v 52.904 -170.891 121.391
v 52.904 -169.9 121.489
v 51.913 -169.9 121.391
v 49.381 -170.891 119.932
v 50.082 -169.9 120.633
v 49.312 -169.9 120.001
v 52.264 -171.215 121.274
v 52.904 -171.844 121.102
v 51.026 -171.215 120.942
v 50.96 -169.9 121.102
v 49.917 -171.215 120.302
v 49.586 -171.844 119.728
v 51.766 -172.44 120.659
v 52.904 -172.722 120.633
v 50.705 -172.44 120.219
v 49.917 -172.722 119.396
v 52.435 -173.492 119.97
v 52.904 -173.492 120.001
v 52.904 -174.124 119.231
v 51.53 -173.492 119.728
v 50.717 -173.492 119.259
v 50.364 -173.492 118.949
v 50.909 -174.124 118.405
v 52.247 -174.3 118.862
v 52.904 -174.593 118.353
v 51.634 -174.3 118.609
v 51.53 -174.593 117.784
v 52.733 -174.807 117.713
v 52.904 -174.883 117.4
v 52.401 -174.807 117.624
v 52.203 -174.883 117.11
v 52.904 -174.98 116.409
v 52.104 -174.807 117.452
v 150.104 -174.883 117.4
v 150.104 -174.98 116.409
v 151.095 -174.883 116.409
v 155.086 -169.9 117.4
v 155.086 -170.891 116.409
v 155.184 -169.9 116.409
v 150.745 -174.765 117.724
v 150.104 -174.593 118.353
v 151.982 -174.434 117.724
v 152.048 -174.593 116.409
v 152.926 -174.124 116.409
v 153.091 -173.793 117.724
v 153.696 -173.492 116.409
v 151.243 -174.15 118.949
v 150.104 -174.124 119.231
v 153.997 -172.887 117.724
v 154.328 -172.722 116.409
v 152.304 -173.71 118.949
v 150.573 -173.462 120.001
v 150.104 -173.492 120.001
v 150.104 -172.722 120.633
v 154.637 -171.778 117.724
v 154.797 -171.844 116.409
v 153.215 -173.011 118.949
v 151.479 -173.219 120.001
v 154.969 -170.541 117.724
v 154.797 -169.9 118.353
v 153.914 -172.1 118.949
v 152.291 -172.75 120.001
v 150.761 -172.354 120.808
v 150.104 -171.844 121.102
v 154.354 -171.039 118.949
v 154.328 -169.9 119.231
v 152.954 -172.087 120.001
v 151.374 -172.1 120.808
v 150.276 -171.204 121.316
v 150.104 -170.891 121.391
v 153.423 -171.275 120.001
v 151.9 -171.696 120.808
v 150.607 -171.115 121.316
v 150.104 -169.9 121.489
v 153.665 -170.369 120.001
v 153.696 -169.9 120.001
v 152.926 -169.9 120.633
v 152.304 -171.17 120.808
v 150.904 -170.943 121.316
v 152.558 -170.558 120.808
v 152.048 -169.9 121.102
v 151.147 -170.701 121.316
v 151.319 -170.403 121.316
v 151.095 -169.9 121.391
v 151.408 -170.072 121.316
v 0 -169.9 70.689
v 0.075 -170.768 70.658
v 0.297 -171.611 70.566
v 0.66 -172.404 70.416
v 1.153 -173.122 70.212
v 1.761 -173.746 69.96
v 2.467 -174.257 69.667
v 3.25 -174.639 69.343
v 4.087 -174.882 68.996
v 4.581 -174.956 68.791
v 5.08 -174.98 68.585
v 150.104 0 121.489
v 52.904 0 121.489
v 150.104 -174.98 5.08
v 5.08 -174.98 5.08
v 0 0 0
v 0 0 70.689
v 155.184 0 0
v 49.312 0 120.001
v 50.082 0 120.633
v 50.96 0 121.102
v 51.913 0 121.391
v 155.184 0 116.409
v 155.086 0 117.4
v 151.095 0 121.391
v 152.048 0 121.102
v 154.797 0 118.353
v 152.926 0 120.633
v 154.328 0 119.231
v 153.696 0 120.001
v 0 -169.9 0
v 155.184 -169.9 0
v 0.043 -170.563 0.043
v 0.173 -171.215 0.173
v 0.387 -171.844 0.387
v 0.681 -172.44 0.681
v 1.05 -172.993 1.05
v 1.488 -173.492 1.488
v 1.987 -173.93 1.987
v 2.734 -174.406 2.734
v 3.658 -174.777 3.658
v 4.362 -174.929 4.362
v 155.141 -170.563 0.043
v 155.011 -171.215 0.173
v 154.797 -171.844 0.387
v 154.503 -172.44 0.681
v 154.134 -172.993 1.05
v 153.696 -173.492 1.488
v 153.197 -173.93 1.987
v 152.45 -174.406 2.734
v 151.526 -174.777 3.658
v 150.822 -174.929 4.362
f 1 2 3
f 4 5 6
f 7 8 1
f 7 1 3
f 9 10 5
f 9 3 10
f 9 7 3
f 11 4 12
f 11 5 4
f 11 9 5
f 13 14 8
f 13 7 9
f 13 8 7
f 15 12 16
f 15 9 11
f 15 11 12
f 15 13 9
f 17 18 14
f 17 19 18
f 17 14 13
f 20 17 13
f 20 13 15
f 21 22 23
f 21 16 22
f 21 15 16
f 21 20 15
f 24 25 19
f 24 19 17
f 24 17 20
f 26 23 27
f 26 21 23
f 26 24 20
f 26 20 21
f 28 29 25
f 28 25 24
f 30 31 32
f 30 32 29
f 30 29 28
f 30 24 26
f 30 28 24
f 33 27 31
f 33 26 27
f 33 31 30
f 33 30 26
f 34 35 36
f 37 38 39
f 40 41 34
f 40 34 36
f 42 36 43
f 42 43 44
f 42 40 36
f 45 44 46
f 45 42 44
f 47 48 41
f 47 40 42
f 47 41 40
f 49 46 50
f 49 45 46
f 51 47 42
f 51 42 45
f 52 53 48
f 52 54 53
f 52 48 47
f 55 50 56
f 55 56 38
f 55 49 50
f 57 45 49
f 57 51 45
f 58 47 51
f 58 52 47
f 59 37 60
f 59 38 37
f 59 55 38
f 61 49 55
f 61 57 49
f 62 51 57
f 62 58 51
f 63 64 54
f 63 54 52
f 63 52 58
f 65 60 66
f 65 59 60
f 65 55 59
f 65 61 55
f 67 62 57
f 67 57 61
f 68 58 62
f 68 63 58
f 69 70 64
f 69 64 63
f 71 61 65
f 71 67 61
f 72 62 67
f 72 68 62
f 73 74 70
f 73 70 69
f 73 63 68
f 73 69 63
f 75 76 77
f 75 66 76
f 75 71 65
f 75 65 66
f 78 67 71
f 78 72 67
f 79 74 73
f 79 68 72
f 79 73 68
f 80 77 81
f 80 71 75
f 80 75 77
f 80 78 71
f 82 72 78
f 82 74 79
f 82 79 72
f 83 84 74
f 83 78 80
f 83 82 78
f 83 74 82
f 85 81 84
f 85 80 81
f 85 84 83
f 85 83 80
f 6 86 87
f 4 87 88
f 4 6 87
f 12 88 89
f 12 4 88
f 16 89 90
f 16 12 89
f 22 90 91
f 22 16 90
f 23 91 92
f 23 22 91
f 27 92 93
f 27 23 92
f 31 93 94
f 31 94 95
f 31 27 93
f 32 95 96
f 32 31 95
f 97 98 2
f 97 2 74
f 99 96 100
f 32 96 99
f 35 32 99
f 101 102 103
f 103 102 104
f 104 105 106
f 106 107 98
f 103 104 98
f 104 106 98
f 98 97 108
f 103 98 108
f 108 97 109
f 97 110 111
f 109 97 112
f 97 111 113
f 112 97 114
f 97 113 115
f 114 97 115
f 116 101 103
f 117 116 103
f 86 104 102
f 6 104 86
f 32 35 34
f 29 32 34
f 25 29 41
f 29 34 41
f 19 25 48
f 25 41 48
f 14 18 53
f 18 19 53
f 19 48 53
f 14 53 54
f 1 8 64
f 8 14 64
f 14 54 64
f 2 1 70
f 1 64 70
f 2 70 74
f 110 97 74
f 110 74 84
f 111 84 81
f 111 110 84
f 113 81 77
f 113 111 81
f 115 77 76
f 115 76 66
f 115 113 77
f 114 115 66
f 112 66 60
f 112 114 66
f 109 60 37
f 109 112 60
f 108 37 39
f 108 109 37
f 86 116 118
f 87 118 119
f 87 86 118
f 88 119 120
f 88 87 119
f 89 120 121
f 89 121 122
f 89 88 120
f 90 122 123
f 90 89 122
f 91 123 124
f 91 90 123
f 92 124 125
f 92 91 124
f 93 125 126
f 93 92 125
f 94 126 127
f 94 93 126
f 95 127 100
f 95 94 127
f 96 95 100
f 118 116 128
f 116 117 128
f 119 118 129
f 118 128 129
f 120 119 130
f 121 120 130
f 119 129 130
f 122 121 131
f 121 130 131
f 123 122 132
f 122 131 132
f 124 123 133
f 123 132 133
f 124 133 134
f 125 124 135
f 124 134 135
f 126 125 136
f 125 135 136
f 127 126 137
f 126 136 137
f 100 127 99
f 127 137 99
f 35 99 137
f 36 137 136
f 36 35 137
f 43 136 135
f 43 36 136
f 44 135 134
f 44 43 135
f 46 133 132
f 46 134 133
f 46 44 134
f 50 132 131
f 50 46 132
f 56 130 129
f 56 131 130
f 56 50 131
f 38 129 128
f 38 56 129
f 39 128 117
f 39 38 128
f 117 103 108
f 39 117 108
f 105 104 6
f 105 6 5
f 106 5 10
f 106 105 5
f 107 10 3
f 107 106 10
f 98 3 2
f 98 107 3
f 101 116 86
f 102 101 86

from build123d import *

# Parameters (mm, degrees)
F0_W         = 155.1840901375
F0_H         = 121.4890033007
F1_DEPTH     = 174.9801635742
F2_SIZE      = 50.8
F3_R         = 5.08
F4_T1_DEPTH  = 182.6001635742
F4_T3_DEPTH  = 175.1606758164
F4_T8_DEPTH  = 5.08
F4_S13_W     = 5.08
F4_S13_H     = 5.08
F4_T14_DEPTH = 5.08


# Not quite as in the source:
# - a fillet or chamfer that OpenCascade refuses, or shapes differently, is made with other operations: its cross-section is extruded or revolved along the edge and cut away or added


with BuildPart() as f1:
    # F0 (on Front) → F1 (new body)
    with BuildSketch(Plane.XZ):
        with Locations((77.5920450687, 60.7445016503)):
            Rectangle(F0_W, F0_H)
    extrude(amount=F1_DEPTH)

    # F2
    f2_edges = [f1.edges().sort_by_distance(p)[0] for p in [
        (0, -87.490082, 121.489003),
    ]]
    chamfer(f2_edges, length=F2_SIZE)

    # F3
    f3_edges = [f1.edges().sort_by_distance(p)[0] for p in [
        (25.4, -174.980164, 96.089003),
        (0, -174.980164, 35.344502),
        (77.592045, -174.980164, 0),
        (102.992045, -174.980164, 121.489003),
        (155.18409, -174.980164, 60.744502),
    ]]
    fillet(f3_edges, radius=F3_R)

    # F4: fillet of radius 5.08 on 4 edges, made by hand

    # F4_s2 → F4_t1 (cut)
    with BuildSketch(Plane.XZ.offset(-12.7)):
        with BuildLine():
            ThreePointArc((150.1040901375, 121.4890033007), (153.6961925859, 120.0011057491), (155.1840901375, 116.4090033007))
            Line((155.1840901375, 116.4090033007), (155.1840901375, 121.4890033007))
            Line((155.1840901375, 121.4890033007), (150.1040901375, 121.4890033007))
        make_face()
    extrude(amount=F4_T1_DEPTH, mode=Mode.SUBTRACT)

    # F4_s4 → F4_t3 (cut)
    with BuildSketch(Plane.XZ.offset(-5.2605122421)):
        with BuildLine():
            ThreePointArc((49.3121024484, 120.0011057491), (50.9601730604, 121.1023113258), (52.9042048969, 121.4890033007))
            Line((52.9042048969, 121.4890033007), (50.8, 121.4890033007))
            Line((50.8, 121.4890033007), (49.3121024484, 120.0011057491))
        make_face()
    extrude(amount=F4_T3_DEPTH, mode=Mode.SUBTRACT)


with BuildPart() as f4_tool6:
    # F4_s7 → F4_t8 (new body)
    with BuildSketch(Plane.XZ.offset(169.9001635742)):
        Polygon((52.9042048969, 116.4090033007), (49.3121024484, 120.0011057491), (50.8, 121.4890033007), (52.9042048969, 121.4890033007), align=None)
    extrude(amount=F4_T8_DEPTH)

    # F4_s9 → F4_t10 (revolve, cut)
    with BuildSketch(Plane(origin=(52.9042048969, -169.9001635742, 116.4090033007), x_dir=(0.3826834324, 0, -0.9238795325), z_dir=(-0.9238795325, 0, -0.3826834324))):
        with BuildLine():
            ThreePointArc((0, -5.08), (5.08, 0), (0, 5.08))
            Line((0, 5.08), (0, -5.08))
        make_face()
    revolve(axis=Axis((52.9042048969, -169.9001635742, 116.4090033007), (0, -1, 0)), mode=Mode.SUBTRACT)


with BuildPart() as f1_1:
    add(f1.part)

    # F4_t5: cut F4_tool6
    add(f4_tool6.part, mode=Mode.SUBTRACT)


with BuildPart() as f4_tool12:
    # F4_s13 → F4_t14 (new body)
    with BuildSketch(Plane.XY.offset(116.4090033007)):
        with Locations((152.6440901375, -172.4401635742)):
            Rectangle(F4_S13_W, F4_S13_H)
    extrude(amount=F4_T14_DEPTH)

    # F4_s15 → F4_t16 (revolve, cut)
    with BuildSketch(Plane(origin=(150.1040901375, -169.9001635742, 116.4090033007), x_dir=(-0.7071067812, 0.7071067812, 0), z_dir=(0.7071067812, 0.7071067812, 0))):
        with BuildLine():
            ThreePointArc((0, -5.08), (5.08, 0), (0, 5.08))
            Line((0, 5.08), (0, -5.08))
        make_face()
    revolve(axis=Axis((150.1040901375, -169.9001635742, 116.4090033007), (0, 0, 1)), mode=Mode.SUBTRACT)


with BuildPart() as f1_2:
    add(f1_1.part)

    # F4_t11: cut F4_tool12
    add(f4_tool12.part, mode=Mode.SUBTRACT)


solid = f1_2.part
